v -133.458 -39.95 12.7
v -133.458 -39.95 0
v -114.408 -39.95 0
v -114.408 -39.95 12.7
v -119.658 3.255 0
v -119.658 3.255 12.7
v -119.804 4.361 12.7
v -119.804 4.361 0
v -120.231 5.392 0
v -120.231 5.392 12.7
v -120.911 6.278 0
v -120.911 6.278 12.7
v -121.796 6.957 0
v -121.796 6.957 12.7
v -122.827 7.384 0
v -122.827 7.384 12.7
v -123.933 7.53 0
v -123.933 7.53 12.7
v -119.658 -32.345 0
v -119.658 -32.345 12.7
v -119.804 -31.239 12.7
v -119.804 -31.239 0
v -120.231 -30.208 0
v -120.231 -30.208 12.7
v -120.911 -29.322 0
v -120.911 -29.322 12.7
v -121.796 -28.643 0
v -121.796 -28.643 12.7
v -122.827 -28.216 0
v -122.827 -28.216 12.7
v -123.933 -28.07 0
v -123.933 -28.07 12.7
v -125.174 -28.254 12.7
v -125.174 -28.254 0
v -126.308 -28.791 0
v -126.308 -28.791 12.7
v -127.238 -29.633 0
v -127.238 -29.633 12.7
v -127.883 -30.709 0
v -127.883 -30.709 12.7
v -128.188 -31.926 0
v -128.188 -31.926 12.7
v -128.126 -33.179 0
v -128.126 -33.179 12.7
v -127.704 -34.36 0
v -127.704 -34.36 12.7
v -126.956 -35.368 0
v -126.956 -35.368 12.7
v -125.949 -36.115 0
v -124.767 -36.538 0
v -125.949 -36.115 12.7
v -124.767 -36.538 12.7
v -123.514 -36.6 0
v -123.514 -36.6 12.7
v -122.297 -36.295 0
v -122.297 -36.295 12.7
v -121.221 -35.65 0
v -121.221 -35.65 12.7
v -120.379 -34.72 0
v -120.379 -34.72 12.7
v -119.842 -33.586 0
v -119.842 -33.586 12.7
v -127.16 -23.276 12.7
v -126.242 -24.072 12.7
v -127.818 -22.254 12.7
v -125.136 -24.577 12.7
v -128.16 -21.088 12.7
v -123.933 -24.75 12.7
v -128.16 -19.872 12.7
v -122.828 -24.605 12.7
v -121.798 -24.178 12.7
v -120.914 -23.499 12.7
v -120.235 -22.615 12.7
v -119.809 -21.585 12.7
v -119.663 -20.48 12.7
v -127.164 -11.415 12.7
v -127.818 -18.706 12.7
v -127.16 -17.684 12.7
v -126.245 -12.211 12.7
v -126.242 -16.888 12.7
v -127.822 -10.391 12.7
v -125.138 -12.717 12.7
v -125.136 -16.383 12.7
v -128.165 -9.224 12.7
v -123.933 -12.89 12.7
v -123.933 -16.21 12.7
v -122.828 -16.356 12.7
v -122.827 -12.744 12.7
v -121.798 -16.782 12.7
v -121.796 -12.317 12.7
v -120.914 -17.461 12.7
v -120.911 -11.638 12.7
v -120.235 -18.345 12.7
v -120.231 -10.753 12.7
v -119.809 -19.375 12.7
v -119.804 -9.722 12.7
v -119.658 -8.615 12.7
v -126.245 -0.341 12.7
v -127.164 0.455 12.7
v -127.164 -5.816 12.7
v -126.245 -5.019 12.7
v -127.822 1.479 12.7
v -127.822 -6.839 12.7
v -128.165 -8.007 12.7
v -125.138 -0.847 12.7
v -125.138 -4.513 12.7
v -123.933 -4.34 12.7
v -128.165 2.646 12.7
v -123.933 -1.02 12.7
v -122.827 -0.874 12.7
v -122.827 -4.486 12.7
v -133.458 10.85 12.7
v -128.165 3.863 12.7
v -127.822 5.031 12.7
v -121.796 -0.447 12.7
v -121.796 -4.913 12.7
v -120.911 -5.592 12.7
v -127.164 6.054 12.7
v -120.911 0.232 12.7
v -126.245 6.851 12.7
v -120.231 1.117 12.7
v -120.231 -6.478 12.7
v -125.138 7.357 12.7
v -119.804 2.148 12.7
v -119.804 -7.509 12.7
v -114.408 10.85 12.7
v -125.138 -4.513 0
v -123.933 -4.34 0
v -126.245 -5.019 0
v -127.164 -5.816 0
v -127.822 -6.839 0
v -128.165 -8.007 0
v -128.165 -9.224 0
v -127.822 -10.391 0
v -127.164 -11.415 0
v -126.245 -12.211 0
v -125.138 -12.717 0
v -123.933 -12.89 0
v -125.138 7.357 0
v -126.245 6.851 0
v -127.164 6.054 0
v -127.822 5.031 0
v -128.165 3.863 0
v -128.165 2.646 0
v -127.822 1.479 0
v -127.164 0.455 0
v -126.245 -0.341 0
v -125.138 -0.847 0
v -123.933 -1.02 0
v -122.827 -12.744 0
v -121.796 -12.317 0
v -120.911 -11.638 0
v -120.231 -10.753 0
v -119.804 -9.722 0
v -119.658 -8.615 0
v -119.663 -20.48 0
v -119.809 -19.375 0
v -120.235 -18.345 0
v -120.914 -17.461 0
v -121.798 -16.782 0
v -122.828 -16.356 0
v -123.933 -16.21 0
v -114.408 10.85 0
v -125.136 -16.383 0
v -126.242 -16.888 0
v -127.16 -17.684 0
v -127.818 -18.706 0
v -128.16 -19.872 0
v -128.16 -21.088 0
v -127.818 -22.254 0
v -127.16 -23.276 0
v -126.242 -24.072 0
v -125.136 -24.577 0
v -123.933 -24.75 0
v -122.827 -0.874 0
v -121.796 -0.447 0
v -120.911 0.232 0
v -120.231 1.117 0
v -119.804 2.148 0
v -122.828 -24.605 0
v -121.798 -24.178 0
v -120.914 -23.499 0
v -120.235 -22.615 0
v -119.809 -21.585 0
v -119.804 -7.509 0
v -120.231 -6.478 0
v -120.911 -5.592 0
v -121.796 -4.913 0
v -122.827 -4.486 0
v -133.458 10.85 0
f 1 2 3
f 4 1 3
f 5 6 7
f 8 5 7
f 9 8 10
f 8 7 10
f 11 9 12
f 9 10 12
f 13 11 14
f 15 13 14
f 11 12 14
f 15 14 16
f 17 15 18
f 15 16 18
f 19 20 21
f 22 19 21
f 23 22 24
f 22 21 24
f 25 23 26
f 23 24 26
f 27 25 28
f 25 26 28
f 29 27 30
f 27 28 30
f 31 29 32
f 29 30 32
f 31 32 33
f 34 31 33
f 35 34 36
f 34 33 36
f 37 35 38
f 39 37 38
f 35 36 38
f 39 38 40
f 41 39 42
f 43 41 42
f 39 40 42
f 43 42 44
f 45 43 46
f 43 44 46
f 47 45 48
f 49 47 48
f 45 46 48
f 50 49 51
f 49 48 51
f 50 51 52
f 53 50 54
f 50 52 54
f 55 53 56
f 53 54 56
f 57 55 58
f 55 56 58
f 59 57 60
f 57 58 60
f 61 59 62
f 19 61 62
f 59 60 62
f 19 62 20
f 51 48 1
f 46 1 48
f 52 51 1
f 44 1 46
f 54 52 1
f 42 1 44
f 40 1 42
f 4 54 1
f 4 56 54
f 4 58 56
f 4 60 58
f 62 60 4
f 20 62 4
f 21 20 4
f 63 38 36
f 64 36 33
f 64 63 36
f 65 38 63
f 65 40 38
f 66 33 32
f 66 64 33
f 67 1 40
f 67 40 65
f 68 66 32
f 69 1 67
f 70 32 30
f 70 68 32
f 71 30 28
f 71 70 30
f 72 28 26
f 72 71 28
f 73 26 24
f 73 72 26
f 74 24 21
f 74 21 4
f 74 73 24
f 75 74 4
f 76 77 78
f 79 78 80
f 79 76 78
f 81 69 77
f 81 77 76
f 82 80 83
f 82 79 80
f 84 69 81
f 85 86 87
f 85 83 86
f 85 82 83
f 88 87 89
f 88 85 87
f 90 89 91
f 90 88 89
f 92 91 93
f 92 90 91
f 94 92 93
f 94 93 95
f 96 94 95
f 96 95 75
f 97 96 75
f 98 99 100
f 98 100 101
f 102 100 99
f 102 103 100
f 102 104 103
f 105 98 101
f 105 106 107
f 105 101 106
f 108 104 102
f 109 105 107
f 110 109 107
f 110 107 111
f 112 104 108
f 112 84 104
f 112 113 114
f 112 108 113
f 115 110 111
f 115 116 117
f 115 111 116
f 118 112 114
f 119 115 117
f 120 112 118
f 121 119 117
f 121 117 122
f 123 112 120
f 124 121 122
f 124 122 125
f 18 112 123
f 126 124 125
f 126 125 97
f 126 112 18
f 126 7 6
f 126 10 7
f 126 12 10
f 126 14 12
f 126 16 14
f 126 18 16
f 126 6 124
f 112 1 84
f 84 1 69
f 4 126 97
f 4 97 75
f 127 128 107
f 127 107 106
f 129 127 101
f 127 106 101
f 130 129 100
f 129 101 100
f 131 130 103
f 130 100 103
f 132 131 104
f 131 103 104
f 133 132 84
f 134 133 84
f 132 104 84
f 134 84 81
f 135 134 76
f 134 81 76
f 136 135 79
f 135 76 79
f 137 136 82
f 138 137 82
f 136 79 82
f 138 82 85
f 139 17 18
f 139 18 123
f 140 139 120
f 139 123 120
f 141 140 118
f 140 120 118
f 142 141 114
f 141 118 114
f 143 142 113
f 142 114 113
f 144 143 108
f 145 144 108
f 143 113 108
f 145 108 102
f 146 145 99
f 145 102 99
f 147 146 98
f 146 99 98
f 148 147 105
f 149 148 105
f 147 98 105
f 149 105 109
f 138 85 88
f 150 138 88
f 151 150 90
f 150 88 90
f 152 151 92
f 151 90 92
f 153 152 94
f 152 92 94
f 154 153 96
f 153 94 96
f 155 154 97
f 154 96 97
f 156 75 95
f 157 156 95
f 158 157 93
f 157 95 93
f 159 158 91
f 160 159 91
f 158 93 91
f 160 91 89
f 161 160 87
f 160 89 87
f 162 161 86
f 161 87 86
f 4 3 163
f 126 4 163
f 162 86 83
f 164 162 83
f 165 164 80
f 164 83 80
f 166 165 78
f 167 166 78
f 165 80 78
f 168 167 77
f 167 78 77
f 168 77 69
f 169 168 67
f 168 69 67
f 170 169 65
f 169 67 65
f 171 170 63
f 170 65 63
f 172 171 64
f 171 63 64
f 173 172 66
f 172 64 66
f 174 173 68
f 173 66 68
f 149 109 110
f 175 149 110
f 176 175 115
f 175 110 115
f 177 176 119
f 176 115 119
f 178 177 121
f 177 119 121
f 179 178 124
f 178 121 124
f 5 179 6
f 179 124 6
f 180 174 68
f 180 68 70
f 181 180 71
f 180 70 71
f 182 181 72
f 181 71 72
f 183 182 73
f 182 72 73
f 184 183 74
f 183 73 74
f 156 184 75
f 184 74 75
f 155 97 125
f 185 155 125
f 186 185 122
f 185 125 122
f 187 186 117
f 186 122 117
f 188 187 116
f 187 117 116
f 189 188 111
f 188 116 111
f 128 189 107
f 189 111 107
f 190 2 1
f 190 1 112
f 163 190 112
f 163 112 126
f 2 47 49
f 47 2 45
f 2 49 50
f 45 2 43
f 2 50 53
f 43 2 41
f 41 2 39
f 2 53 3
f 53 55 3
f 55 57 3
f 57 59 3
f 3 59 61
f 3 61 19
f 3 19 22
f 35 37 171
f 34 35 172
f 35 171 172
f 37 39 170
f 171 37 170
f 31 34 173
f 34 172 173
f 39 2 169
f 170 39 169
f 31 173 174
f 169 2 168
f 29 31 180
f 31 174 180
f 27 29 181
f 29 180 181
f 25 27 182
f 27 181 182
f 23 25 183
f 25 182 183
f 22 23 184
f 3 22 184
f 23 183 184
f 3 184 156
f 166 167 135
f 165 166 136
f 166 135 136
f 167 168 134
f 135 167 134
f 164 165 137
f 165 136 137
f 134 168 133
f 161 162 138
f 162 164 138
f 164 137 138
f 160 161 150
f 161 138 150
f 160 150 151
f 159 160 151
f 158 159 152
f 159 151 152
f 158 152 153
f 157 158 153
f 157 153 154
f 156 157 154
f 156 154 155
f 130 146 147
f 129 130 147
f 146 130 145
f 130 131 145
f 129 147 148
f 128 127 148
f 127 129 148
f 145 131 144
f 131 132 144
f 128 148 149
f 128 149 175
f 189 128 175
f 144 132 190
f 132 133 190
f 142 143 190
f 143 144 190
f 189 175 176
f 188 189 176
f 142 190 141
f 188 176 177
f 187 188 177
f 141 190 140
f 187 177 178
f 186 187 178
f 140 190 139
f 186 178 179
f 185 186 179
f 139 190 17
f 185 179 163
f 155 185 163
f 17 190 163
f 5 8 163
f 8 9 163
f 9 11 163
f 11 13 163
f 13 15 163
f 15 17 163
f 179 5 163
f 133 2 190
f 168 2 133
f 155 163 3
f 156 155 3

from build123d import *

# Parameters (mm, degrees)
F0_W     = 19.05
F0_H     = 50.8
F1_DEPTH = 12.7
F3_DEPTH = 25


with BuildPart() as f1:
    # F0 (on Top) → F1 (new body)
    with BuildSketch(Plane.XY):
        with Locations((-123.9333823323, -14.550125433)):
            Rectangle(F0_W, F0_H)
    extrude(amount=F1_DEPTH)

    # F2 (on face) → F3 (cut)
    with BuildSketch(Plane.XY.offset(12.7)):
        with BuildLine():
            ThreePointArc((-119.6583823323, -32.345125433), (-120.9105008428, -29.3222439434), (-123.9333823323, -28.070125433))
            ThreePointArc((-123.9333823323, -28.070125433), (-126.9562638219, -35.3680069226), (-119.6583823323, -32.345125433))
        make_face()
        with BuildLine():
            ThreePointArc((-119.6633823323, -20.480125433), (-120.9140363767, -17.4607794774), (-123.9333823323, -16.210125433))
            ThreePointArc((-123.9333823323, -16.210125433), (-128.2033823323, -20.480125433), (-123.9333823323, -24.750125433))
            ThreePointArc((-123.9333823323, -24.750125433), (-120.9140363767, -23.4994713887), (-119.6633823323, -20.480125433))
        make_face()
        with BuildLine():
            ThreePointArc((-119.6583823323, -8.615125433), (-120.9105008428, -5.5922439434), (-123.9333823323, -4.340125433))
            ThreePointArc((-123.9333823323, -4.340125433), (-128.2083823323, -8.615125433), (-123.9333823323, -12.890125433))
            ThreePointArc((-123.9333823323, -12.890125433), (-120.9105008428, -11.6380069226), (-119.6583823323, -8.615125433))
        make_face()
        with BuildLine():
            ThreePointArc((-119.6583823323, 3.254874567), (-120.9105008428, 6.2777560566), (-123.9333823323, 7.529874567))
            ThreePointArc((-123.9333823323, 7.529874567), (-128.2083823323, 3.254874567), (-123.9333823323, -1.020125433))
            ThreePointArc((-123.9333823323, -1.020125433), (-120.9105008428, 0.2319930774), (-119.6583823323, 3.254874567))
        make_face()
    extrude(amount=-F3_DEPTH, mode=Mode.SUBTRACT)


solid = f1.part
